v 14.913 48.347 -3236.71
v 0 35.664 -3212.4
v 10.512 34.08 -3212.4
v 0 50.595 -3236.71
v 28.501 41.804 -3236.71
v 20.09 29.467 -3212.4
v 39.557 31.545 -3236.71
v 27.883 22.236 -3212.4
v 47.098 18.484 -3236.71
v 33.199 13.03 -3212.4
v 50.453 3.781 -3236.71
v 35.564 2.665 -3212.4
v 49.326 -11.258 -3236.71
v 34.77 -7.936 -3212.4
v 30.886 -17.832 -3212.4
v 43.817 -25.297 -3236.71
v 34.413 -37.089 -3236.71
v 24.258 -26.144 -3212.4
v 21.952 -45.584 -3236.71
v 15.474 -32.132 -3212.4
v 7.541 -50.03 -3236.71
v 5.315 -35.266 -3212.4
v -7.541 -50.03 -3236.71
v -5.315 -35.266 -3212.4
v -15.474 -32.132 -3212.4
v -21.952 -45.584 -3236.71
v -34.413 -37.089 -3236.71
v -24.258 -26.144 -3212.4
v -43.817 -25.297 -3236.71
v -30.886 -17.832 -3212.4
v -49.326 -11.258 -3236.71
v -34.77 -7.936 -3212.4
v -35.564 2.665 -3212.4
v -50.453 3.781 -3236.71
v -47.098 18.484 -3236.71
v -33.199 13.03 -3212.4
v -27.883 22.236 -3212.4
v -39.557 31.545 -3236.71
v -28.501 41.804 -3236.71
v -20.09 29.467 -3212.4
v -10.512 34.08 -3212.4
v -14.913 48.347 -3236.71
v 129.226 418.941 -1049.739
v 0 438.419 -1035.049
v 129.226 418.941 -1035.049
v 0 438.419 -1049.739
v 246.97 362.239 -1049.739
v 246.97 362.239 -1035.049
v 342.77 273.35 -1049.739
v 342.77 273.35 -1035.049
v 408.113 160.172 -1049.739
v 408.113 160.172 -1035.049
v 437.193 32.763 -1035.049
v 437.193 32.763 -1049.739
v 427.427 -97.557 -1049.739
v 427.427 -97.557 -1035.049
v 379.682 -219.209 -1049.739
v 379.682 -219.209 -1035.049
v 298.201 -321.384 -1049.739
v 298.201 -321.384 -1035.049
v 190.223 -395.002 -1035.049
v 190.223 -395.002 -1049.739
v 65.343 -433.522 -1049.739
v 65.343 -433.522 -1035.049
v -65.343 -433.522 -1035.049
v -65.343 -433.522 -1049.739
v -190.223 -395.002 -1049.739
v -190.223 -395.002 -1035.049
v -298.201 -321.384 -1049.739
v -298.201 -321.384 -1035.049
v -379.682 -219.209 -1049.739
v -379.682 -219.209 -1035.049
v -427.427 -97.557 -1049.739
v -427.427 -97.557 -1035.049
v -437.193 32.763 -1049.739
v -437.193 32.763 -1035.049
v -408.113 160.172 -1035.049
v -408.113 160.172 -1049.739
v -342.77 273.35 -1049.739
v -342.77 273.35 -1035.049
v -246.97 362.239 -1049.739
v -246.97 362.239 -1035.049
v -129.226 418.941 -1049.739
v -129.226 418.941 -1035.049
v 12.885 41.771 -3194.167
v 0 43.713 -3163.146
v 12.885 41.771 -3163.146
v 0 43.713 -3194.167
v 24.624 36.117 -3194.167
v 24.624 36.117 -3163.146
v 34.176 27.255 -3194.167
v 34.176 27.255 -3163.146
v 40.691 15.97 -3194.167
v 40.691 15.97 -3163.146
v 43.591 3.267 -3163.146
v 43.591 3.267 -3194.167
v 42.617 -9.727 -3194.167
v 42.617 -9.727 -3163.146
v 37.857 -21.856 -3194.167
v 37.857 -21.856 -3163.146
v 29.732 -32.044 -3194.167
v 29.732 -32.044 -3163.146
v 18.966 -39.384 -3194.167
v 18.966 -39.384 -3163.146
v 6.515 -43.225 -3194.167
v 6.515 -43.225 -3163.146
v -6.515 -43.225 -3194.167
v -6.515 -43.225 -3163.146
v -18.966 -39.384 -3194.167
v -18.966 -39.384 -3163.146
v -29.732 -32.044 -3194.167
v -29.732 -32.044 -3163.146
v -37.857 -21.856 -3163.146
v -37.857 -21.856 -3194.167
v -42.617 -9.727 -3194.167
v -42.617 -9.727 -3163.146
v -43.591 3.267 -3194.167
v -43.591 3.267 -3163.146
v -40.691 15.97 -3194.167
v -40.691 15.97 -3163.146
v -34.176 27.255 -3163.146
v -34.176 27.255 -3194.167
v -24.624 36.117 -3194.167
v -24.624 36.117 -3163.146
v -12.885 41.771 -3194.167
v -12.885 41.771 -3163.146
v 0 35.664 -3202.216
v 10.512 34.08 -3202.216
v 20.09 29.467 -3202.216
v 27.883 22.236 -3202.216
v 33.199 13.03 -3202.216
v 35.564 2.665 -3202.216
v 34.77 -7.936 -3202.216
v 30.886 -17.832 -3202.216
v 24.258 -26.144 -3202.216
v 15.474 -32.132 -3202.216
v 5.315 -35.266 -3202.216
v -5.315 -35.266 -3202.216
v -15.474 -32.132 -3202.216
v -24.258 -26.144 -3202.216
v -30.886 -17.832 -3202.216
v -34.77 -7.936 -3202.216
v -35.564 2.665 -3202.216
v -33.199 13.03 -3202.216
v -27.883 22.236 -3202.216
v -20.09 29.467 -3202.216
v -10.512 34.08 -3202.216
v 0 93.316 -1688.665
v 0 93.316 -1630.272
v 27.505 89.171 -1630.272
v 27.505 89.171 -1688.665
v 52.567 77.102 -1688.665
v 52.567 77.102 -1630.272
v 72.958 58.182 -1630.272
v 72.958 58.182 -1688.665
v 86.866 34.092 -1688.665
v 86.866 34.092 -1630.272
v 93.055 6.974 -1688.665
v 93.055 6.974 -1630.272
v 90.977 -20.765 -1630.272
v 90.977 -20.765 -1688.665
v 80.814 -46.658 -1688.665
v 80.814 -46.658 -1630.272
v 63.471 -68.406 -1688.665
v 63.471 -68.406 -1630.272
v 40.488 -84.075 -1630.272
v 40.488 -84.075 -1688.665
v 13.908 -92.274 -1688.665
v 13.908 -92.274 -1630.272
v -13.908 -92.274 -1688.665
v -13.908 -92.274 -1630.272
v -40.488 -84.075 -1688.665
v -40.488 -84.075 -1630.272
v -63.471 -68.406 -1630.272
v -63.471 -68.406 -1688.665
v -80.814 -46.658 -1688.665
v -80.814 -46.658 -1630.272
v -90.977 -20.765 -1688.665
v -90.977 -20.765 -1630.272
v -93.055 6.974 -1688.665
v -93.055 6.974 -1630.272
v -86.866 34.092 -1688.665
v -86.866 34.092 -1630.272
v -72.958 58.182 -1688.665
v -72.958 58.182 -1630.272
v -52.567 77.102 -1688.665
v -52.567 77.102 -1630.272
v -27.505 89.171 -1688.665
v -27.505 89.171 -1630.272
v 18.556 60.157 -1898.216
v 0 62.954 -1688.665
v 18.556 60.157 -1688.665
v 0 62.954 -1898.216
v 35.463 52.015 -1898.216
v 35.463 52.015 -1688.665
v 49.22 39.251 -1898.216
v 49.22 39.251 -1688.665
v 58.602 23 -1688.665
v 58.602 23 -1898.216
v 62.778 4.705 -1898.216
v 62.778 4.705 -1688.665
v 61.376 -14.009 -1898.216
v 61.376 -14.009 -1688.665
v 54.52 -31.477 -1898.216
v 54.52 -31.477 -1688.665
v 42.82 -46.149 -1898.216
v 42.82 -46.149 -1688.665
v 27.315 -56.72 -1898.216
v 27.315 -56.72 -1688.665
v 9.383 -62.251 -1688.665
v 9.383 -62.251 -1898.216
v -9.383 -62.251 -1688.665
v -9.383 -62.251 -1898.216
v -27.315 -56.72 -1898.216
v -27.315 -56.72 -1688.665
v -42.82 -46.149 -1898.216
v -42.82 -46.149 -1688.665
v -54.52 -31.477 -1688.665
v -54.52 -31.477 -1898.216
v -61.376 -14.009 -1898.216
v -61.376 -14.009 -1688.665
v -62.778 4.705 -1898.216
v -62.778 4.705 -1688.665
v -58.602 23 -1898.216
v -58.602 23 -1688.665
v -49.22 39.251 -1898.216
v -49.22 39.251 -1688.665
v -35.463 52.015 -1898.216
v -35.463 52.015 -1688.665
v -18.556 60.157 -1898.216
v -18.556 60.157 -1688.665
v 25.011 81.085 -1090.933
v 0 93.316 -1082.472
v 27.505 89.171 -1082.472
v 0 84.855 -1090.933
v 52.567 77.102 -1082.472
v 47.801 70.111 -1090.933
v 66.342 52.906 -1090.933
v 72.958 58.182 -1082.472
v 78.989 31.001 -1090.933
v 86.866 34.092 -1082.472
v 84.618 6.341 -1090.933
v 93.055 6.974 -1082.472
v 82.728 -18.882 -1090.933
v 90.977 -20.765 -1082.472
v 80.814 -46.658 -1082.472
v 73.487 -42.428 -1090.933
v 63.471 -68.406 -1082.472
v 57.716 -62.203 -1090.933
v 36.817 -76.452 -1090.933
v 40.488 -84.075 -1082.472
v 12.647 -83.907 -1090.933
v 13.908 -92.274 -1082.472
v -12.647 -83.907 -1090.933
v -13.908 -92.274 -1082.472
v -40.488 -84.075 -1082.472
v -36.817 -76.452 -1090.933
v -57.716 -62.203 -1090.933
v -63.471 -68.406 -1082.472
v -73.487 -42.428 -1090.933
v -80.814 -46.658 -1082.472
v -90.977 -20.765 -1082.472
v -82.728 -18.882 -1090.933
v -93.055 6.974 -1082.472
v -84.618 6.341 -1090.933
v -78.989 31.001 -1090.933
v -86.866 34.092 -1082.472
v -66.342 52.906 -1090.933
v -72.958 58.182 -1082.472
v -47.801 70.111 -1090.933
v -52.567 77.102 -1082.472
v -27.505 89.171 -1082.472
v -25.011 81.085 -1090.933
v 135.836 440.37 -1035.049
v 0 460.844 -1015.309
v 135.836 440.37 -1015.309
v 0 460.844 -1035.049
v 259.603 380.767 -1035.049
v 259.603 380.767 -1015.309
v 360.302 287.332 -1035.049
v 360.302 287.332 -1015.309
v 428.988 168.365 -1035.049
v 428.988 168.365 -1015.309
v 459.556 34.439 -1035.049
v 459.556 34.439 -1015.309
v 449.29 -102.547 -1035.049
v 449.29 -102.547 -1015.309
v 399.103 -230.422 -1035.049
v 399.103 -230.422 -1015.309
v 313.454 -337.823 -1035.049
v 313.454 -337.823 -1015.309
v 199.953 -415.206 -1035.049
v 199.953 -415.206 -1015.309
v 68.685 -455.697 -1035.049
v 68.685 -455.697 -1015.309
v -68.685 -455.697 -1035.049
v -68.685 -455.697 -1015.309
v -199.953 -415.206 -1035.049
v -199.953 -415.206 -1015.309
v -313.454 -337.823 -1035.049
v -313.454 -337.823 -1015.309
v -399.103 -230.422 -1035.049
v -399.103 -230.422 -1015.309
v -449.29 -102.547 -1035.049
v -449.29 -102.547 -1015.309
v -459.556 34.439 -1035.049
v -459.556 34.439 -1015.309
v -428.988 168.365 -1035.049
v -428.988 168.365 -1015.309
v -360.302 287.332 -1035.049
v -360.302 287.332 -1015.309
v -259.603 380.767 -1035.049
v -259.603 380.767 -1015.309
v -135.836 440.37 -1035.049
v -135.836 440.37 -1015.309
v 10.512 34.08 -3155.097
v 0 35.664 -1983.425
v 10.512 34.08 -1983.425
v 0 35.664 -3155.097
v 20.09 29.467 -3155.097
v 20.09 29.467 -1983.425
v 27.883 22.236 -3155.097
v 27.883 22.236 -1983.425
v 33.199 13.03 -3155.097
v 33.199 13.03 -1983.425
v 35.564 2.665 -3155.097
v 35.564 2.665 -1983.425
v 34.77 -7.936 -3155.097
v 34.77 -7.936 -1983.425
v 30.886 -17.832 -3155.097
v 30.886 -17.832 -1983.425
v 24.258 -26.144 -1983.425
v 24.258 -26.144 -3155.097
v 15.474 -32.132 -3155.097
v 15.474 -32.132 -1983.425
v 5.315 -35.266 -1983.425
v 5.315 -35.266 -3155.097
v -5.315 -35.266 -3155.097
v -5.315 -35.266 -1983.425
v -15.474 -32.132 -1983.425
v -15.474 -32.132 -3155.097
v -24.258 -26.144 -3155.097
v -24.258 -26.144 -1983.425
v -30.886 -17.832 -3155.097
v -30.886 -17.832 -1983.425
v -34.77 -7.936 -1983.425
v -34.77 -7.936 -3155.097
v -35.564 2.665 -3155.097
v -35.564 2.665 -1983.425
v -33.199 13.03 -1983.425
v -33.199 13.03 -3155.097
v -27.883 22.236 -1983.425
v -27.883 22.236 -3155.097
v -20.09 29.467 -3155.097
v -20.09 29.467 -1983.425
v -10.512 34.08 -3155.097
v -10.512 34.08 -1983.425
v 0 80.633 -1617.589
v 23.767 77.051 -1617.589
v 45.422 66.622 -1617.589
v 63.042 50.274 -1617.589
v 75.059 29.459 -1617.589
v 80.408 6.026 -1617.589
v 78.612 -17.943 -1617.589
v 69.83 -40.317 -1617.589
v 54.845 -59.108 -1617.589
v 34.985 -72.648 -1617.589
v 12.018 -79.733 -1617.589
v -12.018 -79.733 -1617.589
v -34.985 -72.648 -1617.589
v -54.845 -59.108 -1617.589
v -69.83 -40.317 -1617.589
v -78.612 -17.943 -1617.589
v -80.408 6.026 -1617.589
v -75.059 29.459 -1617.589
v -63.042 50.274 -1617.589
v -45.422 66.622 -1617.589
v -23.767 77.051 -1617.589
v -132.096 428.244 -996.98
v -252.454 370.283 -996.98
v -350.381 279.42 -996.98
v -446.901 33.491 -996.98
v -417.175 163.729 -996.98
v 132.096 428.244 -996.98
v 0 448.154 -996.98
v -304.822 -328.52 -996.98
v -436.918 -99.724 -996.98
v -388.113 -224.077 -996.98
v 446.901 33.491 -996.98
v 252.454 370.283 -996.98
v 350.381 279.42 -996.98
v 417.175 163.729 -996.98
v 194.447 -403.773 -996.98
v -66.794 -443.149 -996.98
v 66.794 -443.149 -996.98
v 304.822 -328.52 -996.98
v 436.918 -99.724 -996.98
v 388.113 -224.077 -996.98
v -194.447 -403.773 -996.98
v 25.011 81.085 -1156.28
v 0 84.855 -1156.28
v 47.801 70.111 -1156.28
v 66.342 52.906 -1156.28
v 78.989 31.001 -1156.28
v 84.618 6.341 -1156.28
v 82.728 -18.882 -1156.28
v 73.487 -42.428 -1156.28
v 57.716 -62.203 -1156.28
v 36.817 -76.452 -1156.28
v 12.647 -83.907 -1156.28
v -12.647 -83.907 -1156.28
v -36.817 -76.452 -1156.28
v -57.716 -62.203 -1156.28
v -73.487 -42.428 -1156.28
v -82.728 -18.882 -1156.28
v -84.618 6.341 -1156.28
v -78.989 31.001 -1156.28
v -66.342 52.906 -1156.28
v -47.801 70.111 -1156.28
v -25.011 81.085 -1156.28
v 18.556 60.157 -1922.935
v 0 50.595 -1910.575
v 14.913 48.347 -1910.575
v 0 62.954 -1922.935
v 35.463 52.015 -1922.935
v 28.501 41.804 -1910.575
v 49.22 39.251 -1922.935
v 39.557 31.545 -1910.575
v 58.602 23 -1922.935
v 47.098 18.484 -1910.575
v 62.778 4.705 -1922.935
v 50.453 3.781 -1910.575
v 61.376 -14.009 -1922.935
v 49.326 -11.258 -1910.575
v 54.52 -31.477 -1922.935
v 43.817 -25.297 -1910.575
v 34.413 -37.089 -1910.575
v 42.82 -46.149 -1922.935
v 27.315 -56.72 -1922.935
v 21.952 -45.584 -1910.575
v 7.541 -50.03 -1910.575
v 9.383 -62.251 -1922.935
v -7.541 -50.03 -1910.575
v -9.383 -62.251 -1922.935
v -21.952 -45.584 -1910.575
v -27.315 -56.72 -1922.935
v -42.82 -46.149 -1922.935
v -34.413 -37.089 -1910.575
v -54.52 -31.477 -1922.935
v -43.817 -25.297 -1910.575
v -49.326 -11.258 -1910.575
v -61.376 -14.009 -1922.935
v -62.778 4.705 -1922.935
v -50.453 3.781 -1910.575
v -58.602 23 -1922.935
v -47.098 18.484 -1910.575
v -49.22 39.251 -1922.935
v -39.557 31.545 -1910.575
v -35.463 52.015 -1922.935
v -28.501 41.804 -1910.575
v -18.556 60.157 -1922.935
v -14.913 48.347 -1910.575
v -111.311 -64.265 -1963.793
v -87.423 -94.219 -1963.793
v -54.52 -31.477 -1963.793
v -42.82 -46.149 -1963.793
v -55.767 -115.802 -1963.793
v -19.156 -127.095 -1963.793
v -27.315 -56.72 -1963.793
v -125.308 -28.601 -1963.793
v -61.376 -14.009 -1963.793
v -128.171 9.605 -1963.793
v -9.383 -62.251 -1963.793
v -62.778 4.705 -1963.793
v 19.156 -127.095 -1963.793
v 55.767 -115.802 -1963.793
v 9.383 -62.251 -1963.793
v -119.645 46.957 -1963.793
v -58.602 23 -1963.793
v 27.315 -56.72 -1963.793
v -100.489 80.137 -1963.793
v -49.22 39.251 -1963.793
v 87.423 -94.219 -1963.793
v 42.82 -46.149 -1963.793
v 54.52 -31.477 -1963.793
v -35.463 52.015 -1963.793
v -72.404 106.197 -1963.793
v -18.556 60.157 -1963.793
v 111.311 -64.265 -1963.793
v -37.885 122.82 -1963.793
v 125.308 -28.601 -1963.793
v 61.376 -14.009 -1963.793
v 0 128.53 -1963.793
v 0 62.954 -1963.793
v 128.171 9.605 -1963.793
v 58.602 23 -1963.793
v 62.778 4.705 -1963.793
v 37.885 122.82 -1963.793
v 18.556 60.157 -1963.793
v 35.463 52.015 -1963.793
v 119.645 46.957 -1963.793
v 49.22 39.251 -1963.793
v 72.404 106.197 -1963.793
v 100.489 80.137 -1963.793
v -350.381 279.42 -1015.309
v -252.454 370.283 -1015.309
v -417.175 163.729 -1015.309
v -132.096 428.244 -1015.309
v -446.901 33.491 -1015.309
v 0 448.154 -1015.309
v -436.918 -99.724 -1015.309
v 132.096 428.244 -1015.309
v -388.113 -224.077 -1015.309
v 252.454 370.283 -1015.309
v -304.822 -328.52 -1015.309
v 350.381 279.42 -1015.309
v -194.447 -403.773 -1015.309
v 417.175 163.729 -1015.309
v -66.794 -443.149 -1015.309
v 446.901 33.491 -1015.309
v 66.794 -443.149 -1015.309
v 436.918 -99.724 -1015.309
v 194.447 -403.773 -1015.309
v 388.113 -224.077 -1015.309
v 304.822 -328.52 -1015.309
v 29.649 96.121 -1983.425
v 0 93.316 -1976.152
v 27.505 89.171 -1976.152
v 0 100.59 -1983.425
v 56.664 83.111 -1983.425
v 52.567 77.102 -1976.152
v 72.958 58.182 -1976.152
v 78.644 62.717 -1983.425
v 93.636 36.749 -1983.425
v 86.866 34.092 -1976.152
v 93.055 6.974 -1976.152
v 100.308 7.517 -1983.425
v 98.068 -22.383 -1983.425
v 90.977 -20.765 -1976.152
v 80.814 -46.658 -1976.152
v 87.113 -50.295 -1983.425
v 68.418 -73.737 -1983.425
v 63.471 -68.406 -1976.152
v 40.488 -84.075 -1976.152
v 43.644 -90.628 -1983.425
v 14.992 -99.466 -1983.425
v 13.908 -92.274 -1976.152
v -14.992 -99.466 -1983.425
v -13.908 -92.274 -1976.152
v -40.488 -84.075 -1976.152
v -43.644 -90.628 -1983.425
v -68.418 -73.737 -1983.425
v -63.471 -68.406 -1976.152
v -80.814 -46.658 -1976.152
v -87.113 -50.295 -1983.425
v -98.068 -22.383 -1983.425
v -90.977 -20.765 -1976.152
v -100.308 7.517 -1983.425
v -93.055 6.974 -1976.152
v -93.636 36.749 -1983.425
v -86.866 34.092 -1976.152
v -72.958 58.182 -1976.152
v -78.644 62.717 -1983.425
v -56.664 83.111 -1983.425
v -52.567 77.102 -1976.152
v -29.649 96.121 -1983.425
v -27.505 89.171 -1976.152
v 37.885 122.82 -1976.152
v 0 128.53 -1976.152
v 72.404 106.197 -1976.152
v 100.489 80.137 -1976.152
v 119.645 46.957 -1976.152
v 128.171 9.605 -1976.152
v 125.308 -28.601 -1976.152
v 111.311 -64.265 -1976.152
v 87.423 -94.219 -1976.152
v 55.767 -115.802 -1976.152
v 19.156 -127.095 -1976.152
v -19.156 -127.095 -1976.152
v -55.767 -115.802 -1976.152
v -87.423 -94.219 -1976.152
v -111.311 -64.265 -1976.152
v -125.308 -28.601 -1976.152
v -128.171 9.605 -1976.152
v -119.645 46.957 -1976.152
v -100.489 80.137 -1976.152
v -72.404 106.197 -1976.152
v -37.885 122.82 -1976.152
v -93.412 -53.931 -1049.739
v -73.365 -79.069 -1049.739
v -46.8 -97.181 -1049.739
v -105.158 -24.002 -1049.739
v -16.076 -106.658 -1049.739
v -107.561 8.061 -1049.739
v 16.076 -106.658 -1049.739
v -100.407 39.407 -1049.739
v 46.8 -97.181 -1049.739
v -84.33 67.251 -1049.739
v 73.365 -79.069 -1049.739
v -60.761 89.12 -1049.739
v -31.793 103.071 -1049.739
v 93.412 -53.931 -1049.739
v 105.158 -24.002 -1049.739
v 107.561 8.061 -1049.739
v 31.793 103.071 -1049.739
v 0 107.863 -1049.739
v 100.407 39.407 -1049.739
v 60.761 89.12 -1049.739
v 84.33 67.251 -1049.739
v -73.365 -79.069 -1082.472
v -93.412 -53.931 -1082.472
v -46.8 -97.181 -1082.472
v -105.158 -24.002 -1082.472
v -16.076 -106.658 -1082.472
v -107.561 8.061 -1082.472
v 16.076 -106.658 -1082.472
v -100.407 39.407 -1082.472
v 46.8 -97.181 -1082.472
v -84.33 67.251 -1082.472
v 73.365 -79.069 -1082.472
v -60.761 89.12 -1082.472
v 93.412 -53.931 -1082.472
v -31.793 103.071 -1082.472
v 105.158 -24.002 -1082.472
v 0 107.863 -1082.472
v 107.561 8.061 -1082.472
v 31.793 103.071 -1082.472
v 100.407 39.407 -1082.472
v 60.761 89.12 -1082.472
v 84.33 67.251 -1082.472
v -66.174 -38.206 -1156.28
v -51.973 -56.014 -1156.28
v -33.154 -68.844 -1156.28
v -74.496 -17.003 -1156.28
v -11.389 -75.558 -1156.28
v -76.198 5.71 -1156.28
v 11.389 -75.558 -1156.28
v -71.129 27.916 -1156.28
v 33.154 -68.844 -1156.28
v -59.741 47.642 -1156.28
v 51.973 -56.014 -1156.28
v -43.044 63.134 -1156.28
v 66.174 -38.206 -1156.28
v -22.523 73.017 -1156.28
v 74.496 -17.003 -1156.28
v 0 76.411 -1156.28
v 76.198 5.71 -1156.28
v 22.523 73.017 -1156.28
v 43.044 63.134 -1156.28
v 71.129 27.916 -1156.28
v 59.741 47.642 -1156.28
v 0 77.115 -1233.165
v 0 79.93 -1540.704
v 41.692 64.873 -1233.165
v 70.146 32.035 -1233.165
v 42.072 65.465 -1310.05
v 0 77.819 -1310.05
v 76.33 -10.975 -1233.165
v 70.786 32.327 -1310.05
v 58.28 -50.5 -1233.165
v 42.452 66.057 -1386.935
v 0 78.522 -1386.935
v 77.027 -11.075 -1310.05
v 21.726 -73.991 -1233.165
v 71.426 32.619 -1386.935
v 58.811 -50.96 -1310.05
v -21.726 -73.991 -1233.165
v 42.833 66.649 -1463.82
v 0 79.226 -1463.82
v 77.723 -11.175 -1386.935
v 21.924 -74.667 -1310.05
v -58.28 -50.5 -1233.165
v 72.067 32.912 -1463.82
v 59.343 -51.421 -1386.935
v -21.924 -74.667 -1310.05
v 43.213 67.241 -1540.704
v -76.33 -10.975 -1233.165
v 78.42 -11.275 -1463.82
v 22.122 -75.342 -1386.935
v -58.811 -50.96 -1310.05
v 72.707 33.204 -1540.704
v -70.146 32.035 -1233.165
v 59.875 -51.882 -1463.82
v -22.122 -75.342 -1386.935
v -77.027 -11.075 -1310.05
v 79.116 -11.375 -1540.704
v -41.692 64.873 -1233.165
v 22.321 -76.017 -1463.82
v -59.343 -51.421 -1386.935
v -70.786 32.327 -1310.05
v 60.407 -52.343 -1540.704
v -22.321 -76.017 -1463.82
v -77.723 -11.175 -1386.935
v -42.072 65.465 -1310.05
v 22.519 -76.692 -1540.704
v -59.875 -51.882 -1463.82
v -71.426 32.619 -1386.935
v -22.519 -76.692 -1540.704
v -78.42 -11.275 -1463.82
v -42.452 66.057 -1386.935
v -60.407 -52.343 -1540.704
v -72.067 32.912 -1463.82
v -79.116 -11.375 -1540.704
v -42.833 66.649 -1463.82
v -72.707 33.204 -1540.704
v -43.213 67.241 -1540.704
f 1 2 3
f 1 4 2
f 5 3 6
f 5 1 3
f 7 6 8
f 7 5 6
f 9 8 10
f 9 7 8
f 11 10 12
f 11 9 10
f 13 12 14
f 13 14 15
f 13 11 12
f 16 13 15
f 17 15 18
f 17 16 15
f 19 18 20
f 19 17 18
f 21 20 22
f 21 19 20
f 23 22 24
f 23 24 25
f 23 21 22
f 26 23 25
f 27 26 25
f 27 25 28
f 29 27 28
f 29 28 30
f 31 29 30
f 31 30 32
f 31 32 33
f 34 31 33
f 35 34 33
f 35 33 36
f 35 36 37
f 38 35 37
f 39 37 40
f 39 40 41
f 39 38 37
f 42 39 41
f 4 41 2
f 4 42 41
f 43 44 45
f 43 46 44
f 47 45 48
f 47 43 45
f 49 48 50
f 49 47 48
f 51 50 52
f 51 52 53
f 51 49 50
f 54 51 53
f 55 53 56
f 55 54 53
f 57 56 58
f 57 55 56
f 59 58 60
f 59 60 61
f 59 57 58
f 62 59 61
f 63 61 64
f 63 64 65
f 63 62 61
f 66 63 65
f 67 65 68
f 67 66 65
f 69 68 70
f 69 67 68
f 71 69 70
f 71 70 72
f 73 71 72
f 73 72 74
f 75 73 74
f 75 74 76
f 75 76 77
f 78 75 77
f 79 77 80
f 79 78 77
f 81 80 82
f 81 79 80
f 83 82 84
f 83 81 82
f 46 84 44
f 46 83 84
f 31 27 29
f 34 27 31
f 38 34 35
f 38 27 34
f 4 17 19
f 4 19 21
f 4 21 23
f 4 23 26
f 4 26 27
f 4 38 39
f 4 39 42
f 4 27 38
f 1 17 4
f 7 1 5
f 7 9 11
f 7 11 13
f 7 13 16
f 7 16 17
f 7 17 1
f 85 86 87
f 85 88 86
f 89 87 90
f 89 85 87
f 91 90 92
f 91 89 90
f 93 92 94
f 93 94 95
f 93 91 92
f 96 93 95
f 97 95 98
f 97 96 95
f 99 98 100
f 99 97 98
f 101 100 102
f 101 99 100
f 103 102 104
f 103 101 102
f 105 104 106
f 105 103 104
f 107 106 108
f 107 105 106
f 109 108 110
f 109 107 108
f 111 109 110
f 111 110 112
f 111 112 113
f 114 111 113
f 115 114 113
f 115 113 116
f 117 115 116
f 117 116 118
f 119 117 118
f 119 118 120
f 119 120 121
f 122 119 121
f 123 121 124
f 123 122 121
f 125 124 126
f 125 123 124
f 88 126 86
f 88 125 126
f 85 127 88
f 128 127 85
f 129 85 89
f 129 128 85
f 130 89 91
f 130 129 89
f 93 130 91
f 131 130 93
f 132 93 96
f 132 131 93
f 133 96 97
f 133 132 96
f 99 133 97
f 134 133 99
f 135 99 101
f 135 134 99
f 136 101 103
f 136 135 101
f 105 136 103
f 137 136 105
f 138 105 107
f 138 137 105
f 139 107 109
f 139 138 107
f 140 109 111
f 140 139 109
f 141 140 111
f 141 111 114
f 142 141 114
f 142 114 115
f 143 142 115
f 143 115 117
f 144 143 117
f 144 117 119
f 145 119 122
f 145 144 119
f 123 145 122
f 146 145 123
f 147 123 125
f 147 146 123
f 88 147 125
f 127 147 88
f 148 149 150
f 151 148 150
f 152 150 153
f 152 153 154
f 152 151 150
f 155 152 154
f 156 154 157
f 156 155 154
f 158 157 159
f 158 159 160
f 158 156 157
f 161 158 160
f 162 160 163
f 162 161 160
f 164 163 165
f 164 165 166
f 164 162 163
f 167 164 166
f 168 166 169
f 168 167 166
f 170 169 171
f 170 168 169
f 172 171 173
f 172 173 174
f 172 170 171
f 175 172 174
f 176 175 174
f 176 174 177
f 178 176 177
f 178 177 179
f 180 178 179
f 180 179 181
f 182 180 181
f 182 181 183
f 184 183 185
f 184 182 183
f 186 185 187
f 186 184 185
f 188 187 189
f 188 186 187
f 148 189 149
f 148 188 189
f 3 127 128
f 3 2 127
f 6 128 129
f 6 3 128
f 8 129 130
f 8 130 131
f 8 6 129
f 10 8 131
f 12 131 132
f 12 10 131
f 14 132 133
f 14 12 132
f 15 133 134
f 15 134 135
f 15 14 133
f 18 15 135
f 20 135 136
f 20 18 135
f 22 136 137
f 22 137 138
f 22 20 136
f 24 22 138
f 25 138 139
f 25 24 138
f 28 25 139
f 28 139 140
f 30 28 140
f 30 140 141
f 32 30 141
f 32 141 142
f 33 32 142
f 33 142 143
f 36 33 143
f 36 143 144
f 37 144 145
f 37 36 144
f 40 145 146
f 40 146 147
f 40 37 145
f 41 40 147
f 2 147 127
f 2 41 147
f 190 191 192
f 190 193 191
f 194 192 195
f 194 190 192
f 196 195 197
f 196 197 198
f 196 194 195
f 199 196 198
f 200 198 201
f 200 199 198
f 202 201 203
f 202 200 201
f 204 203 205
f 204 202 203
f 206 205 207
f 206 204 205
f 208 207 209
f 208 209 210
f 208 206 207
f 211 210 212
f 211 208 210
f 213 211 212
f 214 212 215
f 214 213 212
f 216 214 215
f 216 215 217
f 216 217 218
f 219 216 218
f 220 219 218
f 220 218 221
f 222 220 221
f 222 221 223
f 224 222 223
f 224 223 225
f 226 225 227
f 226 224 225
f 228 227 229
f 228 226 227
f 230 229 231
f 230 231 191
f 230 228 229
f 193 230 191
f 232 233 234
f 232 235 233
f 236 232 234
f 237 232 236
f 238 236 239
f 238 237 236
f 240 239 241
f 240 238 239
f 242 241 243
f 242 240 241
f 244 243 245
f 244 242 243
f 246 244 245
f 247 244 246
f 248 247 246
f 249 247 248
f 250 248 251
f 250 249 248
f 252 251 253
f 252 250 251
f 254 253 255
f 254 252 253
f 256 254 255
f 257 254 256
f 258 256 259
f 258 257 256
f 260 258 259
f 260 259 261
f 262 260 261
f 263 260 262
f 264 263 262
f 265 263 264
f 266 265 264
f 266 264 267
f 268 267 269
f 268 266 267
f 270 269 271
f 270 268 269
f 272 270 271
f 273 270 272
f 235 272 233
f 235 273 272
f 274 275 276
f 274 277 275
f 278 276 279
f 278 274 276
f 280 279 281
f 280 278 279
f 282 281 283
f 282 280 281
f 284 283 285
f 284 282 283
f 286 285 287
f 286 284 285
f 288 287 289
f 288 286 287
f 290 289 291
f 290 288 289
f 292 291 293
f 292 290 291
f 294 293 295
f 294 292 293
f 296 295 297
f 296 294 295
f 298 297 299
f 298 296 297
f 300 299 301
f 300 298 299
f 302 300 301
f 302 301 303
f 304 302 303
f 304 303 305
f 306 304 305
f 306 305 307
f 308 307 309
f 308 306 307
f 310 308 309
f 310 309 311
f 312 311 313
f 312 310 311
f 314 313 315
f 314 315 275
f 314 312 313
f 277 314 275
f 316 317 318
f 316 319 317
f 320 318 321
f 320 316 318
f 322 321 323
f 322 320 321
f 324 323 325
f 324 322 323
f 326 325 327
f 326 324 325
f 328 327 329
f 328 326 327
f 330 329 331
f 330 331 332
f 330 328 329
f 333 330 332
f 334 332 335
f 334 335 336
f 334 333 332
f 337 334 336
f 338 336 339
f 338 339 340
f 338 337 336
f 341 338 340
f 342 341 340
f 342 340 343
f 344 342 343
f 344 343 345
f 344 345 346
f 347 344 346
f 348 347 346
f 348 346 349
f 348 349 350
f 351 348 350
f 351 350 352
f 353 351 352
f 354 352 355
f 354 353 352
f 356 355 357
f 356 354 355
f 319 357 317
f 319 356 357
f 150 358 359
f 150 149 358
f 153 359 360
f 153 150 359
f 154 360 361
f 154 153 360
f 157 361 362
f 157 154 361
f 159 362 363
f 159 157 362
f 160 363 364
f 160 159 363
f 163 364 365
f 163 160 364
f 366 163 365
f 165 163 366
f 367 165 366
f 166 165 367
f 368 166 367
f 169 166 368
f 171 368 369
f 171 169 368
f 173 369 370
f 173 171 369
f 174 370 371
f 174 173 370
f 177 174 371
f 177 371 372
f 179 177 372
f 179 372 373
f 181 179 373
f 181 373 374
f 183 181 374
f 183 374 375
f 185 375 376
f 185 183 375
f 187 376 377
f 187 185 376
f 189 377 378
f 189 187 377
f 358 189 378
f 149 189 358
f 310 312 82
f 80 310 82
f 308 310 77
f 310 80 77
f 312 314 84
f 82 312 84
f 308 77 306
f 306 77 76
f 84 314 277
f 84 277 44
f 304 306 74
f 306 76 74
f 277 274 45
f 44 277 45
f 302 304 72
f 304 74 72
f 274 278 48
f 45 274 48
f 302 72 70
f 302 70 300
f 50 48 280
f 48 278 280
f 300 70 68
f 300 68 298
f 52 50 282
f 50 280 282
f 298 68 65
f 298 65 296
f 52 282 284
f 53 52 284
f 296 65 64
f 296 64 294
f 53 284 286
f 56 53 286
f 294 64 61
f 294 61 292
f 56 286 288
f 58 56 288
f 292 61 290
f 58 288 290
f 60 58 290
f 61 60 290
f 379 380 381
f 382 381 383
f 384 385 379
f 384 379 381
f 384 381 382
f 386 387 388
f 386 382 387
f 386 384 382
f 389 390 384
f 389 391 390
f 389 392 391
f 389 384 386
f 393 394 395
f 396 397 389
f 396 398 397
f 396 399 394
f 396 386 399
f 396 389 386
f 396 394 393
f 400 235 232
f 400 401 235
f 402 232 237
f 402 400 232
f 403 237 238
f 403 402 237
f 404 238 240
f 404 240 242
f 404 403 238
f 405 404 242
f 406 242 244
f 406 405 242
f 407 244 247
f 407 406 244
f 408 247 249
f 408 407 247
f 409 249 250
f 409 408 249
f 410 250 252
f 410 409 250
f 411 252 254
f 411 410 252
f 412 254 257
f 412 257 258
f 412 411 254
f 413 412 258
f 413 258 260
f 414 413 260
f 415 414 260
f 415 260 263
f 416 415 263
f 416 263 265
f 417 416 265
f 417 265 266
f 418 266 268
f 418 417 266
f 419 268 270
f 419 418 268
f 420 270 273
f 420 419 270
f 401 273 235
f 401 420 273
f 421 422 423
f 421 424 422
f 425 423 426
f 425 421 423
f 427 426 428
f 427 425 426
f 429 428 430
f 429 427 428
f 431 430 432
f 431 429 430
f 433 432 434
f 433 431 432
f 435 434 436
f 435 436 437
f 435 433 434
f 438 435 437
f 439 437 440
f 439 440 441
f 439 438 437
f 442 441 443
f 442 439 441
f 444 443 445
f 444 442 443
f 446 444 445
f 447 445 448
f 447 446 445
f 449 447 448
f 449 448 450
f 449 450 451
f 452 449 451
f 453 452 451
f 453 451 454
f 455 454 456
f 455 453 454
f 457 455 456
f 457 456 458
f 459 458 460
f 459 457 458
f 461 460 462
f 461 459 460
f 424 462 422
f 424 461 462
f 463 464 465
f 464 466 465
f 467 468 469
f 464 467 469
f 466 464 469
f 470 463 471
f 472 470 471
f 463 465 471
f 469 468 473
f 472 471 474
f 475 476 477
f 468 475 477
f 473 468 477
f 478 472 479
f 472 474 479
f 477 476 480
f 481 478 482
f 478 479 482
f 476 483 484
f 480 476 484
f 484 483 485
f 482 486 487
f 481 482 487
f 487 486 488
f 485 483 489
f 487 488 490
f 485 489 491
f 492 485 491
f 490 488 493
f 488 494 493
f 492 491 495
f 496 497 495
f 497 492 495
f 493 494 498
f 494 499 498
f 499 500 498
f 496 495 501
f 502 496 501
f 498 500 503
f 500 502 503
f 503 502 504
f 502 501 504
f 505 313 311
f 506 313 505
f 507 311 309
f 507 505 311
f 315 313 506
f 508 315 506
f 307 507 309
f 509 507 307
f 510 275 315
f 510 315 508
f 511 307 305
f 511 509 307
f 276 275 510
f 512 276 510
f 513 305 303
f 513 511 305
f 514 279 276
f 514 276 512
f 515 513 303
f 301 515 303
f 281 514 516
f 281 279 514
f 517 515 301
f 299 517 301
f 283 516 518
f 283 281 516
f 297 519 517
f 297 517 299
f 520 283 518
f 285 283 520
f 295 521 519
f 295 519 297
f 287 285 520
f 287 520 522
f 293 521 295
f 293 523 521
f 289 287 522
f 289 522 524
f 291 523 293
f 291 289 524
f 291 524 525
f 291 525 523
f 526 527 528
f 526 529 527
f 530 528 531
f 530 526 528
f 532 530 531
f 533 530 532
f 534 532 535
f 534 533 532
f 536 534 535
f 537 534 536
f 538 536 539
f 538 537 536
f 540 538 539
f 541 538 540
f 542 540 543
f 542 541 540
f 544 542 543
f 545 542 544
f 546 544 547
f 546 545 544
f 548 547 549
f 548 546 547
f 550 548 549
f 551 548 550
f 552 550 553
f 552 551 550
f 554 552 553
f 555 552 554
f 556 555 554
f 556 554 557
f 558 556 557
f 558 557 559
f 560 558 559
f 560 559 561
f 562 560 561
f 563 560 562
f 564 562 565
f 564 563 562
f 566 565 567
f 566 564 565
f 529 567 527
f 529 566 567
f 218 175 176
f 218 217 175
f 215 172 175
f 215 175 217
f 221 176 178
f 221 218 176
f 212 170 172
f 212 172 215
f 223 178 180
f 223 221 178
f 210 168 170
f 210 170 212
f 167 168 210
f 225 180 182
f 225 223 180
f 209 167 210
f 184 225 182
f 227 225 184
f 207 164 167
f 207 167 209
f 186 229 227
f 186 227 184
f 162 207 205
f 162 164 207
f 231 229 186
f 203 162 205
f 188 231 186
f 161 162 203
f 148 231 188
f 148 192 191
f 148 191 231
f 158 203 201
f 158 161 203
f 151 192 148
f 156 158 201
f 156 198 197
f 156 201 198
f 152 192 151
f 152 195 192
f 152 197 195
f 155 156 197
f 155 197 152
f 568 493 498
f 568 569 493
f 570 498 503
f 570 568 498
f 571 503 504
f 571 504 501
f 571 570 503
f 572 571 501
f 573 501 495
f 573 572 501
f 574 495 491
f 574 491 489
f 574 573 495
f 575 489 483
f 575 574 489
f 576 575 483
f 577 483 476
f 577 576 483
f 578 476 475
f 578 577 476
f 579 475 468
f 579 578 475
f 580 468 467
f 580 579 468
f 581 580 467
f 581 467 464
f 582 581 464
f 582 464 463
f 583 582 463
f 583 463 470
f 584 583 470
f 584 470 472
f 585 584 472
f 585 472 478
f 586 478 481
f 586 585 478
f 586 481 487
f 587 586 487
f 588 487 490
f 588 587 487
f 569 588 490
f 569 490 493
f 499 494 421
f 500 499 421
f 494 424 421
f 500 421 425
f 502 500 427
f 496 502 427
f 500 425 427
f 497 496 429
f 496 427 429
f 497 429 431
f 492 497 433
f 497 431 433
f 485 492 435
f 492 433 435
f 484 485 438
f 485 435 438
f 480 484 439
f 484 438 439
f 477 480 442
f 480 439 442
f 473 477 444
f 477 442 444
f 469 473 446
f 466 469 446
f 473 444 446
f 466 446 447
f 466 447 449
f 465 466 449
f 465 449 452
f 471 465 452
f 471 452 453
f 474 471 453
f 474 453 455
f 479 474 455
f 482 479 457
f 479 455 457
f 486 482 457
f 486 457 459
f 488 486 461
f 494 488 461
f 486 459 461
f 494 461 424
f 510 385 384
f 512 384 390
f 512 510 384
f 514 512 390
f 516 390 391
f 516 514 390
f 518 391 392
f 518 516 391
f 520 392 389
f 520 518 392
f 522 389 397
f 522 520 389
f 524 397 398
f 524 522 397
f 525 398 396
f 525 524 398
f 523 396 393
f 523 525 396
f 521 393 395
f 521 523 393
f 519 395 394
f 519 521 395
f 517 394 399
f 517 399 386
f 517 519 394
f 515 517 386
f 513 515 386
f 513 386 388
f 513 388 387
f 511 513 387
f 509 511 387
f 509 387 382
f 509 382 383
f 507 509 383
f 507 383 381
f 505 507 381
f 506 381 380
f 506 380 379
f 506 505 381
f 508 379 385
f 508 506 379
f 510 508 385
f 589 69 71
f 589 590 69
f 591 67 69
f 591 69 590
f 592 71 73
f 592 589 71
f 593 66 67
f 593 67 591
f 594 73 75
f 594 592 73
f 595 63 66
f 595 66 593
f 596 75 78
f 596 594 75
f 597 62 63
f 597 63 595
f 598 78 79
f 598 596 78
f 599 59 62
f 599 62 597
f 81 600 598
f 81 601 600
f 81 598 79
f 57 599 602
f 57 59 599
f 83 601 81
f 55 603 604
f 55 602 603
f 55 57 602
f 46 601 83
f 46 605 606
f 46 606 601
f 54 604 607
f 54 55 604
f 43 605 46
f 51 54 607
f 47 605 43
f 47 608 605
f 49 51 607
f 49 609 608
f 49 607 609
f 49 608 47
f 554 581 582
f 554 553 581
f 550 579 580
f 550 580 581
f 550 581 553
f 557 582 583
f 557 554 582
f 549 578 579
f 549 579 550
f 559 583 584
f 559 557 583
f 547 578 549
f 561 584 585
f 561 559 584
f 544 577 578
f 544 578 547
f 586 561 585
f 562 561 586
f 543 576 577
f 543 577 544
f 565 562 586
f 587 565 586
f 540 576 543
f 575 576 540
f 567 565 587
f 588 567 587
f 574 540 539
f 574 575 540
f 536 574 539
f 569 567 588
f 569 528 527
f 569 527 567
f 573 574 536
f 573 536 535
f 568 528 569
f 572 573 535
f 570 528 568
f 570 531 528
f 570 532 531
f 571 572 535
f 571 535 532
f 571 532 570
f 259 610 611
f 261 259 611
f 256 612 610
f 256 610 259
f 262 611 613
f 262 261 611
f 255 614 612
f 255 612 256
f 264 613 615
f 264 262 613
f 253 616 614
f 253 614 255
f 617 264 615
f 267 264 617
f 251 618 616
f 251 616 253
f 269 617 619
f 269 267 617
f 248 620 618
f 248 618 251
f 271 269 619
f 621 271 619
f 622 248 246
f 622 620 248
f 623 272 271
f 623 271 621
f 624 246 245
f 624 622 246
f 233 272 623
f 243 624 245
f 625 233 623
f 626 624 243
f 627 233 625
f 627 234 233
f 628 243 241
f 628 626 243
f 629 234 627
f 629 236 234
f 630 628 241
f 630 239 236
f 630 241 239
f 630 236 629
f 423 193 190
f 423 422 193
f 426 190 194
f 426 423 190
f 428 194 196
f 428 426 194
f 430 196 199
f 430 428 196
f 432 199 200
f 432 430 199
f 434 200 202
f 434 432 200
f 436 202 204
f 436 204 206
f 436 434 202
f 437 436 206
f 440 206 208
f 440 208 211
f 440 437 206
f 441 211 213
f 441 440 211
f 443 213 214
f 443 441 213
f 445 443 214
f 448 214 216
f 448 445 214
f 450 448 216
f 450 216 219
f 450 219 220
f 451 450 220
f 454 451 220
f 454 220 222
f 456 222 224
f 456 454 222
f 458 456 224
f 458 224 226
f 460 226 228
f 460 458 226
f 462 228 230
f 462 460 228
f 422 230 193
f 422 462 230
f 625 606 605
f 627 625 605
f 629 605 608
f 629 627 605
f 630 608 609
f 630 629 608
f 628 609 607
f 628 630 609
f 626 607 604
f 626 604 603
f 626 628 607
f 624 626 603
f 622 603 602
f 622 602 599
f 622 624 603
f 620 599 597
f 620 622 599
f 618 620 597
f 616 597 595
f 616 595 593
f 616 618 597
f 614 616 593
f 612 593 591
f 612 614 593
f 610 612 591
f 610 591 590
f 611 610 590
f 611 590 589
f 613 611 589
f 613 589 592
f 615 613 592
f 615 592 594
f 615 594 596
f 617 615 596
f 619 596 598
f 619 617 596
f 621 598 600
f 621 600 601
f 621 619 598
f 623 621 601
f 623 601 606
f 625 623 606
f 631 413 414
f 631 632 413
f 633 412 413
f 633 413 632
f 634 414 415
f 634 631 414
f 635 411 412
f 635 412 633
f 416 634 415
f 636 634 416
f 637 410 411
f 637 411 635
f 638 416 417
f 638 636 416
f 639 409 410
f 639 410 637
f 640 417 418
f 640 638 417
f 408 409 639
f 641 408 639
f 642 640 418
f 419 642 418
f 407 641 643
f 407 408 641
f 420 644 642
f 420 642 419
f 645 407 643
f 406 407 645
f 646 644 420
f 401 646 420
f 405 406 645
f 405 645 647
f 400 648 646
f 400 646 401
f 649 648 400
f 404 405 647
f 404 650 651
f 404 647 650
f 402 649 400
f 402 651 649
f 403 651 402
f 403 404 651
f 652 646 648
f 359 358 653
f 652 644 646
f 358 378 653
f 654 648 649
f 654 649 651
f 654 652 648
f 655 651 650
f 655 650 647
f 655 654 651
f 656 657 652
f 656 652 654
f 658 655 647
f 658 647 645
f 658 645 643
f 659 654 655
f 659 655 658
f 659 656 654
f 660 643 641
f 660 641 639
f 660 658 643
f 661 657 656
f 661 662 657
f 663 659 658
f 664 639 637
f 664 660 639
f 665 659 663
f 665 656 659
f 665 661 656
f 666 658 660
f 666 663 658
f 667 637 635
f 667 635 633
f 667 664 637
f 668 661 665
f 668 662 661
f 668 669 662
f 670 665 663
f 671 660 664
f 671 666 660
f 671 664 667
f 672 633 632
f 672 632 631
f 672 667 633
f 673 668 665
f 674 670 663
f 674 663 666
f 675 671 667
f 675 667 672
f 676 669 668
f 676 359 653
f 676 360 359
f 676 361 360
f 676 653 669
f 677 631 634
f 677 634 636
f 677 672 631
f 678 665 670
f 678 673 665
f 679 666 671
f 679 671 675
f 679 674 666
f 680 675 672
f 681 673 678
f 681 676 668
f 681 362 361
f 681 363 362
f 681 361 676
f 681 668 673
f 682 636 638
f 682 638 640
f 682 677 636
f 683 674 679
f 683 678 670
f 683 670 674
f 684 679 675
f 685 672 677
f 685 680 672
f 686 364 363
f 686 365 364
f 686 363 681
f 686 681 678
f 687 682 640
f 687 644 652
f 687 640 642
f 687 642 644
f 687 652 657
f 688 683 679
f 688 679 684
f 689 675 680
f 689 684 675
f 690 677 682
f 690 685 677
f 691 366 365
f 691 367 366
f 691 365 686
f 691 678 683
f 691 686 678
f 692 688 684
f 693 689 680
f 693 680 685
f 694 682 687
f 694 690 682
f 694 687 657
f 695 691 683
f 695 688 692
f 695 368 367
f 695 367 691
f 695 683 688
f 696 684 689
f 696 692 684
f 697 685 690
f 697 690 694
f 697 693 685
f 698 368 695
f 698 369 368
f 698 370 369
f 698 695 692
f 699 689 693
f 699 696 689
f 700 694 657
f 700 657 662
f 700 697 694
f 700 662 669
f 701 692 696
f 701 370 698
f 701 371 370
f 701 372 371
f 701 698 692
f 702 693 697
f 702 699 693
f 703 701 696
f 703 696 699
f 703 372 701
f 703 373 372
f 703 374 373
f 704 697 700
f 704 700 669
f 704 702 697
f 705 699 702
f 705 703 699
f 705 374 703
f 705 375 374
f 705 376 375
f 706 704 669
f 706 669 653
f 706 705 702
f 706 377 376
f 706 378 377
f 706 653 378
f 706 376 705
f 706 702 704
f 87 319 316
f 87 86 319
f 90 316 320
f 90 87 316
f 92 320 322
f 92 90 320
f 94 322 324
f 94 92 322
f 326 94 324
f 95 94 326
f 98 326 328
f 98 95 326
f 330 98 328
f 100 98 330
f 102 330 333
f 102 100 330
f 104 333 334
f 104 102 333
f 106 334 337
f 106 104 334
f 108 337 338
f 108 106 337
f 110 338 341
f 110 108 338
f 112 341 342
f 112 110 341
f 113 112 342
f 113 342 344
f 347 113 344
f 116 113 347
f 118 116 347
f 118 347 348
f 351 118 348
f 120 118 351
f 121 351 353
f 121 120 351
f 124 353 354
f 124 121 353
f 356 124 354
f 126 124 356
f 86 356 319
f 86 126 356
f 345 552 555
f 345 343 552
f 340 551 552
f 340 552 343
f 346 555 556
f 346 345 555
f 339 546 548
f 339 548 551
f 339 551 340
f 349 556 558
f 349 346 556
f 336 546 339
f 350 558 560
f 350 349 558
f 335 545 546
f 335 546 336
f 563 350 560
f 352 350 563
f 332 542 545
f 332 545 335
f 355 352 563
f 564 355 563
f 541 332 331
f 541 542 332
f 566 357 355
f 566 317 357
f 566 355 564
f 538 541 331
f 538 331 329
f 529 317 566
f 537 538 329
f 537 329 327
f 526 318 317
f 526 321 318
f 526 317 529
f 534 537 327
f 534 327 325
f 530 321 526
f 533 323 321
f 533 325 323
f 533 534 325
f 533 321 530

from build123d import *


with BuildPart() as part:
    # Sketch12 → Revolve2 (revolve)
    with BuildSketch(Plane(origin=(0, 0, 0), x_dir=(0, 0, -1), z_dir=(1, 0, 0))):
        Polygon((996.979831822, 0), (996.979831822, 448.154362623), (1015.309498351, 448.154362623), (1015.309498351, 460.844131759), (1035.049139229, 460.844131759), (1035.049139229, 448.154362623), (1035.049139229, 438.418962309), (1049.739382804, 438.418962309), (1049.739382804, 107.862695979), (1082.4718279, 107.862695979), (1082.4718279, 93.31637014), (1090.933076859, 84.855121181), (1156.280143072, 84.855121181), (1156.280143072, 76.411453441), (1617.589293356, 80.633287311), (1630.272376185, 93.31637014), (1688.665257097, 93.31637014), (1688.665257097, 62.954107013), (1898.216315919, 62.954107013), (1910.575471981, 50.594950951), (1922.934628043, 62.954107013), (1950.934428364, 62.954107013), (1963.792504571, 62.954107013), (1963.792504571, 116.171139603), (1963.792504571, 128.530295665), (1976.151660632, 128.530295665), (1976.151660632, 93.31637014), (1983.424823552, 100.58953306), (1983.424823552, 35.664179648), (3155.097212513, 35.664179648), (3163.146026729, 43.712993865), (3194.167030322, 43.712993865), (3202.215844538, 35.664179648), (3212.399611966, 35.664179648), (3236.709720825, 50.594950951), (3236.709720825, 0), align=None)
    revolve(axis=Axis((0, 0, 0), (0, 0, -1)))


solid = part.part
